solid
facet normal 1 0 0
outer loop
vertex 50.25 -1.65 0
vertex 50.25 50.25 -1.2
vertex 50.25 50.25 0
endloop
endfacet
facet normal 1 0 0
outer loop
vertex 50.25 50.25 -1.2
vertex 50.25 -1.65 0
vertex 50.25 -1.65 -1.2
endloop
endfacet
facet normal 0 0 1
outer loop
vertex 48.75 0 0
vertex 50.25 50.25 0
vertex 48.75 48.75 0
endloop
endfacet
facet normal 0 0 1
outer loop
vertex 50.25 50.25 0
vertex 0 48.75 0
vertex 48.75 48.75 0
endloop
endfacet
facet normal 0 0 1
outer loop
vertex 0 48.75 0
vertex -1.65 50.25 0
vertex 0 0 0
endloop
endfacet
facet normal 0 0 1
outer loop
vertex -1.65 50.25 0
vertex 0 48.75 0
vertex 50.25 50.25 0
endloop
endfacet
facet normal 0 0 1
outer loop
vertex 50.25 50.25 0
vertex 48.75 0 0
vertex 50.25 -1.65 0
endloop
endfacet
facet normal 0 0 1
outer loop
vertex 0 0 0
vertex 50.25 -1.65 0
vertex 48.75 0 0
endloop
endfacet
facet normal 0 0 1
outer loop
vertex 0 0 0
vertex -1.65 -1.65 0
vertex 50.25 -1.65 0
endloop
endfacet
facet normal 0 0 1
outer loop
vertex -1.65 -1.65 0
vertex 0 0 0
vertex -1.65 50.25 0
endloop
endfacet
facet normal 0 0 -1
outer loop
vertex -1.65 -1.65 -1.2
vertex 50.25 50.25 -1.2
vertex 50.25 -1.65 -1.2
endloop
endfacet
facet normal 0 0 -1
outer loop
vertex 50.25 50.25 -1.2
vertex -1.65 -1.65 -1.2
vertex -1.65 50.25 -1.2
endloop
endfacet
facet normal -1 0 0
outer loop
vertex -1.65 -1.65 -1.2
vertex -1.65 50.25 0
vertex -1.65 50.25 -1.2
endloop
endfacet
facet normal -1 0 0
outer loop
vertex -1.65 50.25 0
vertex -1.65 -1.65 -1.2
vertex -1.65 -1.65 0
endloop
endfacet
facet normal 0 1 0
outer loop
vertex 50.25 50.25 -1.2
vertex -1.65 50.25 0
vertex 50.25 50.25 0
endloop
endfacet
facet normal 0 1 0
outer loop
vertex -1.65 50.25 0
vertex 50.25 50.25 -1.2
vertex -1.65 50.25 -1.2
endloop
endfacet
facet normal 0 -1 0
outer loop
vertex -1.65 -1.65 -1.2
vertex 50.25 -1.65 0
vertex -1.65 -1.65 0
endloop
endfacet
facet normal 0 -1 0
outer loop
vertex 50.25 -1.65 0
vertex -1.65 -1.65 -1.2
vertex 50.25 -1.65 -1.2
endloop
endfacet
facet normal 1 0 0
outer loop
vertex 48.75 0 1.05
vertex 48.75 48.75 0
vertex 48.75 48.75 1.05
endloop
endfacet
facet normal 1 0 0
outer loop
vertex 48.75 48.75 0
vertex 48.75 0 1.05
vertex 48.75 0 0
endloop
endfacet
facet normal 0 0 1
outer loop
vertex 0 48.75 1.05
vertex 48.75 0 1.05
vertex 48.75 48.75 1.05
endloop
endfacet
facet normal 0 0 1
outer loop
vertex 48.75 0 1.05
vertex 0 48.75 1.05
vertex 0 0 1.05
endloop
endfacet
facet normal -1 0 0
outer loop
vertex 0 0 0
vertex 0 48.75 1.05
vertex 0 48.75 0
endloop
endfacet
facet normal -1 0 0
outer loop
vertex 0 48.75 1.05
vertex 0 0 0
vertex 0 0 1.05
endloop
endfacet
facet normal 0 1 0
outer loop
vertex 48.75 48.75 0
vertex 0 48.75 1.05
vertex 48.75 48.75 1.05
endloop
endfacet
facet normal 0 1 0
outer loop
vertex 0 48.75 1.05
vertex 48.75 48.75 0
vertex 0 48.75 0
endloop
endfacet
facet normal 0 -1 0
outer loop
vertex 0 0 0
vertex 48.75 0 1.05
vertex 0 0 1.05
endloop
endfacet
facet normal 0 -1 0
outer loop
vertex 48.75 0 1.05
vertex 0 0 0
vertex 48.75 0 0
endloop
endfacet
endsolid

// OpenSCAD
//// Upper part of TLD holder with rectangular grid
$fn = 100;

/// Parameters
RED = 0.15;   // Reduction of some parts because of the print properties

A = 8;  // Number of rows
B = 8;  // Number of columns

a = 5.5;  // width of one compartment
b = 5.5;  // length of one compartment

h = 2;  // Inner depth of the compartment

twb = 1.2; // thickness of the bottom/upper wall
tw = 0.7;  // thickness of inner walls
TW = 1.5;  // thickness of outer walls

W = A*a + (A-1)*tw + 2*TW;   // Total width of holder
L = B*b + (B-1)*tw + 2*TW;  // Total length of holder
H = h + twb + 1.2;  // Total heigth of bottom part of the holder


union() {
    translate([-TW-RED, -TW-RED, -twb]) cube([W, L, twb]);
    cube([W-2*TW-RED, L-2*TW-RED, H-h-twb-RED]);
    
}
